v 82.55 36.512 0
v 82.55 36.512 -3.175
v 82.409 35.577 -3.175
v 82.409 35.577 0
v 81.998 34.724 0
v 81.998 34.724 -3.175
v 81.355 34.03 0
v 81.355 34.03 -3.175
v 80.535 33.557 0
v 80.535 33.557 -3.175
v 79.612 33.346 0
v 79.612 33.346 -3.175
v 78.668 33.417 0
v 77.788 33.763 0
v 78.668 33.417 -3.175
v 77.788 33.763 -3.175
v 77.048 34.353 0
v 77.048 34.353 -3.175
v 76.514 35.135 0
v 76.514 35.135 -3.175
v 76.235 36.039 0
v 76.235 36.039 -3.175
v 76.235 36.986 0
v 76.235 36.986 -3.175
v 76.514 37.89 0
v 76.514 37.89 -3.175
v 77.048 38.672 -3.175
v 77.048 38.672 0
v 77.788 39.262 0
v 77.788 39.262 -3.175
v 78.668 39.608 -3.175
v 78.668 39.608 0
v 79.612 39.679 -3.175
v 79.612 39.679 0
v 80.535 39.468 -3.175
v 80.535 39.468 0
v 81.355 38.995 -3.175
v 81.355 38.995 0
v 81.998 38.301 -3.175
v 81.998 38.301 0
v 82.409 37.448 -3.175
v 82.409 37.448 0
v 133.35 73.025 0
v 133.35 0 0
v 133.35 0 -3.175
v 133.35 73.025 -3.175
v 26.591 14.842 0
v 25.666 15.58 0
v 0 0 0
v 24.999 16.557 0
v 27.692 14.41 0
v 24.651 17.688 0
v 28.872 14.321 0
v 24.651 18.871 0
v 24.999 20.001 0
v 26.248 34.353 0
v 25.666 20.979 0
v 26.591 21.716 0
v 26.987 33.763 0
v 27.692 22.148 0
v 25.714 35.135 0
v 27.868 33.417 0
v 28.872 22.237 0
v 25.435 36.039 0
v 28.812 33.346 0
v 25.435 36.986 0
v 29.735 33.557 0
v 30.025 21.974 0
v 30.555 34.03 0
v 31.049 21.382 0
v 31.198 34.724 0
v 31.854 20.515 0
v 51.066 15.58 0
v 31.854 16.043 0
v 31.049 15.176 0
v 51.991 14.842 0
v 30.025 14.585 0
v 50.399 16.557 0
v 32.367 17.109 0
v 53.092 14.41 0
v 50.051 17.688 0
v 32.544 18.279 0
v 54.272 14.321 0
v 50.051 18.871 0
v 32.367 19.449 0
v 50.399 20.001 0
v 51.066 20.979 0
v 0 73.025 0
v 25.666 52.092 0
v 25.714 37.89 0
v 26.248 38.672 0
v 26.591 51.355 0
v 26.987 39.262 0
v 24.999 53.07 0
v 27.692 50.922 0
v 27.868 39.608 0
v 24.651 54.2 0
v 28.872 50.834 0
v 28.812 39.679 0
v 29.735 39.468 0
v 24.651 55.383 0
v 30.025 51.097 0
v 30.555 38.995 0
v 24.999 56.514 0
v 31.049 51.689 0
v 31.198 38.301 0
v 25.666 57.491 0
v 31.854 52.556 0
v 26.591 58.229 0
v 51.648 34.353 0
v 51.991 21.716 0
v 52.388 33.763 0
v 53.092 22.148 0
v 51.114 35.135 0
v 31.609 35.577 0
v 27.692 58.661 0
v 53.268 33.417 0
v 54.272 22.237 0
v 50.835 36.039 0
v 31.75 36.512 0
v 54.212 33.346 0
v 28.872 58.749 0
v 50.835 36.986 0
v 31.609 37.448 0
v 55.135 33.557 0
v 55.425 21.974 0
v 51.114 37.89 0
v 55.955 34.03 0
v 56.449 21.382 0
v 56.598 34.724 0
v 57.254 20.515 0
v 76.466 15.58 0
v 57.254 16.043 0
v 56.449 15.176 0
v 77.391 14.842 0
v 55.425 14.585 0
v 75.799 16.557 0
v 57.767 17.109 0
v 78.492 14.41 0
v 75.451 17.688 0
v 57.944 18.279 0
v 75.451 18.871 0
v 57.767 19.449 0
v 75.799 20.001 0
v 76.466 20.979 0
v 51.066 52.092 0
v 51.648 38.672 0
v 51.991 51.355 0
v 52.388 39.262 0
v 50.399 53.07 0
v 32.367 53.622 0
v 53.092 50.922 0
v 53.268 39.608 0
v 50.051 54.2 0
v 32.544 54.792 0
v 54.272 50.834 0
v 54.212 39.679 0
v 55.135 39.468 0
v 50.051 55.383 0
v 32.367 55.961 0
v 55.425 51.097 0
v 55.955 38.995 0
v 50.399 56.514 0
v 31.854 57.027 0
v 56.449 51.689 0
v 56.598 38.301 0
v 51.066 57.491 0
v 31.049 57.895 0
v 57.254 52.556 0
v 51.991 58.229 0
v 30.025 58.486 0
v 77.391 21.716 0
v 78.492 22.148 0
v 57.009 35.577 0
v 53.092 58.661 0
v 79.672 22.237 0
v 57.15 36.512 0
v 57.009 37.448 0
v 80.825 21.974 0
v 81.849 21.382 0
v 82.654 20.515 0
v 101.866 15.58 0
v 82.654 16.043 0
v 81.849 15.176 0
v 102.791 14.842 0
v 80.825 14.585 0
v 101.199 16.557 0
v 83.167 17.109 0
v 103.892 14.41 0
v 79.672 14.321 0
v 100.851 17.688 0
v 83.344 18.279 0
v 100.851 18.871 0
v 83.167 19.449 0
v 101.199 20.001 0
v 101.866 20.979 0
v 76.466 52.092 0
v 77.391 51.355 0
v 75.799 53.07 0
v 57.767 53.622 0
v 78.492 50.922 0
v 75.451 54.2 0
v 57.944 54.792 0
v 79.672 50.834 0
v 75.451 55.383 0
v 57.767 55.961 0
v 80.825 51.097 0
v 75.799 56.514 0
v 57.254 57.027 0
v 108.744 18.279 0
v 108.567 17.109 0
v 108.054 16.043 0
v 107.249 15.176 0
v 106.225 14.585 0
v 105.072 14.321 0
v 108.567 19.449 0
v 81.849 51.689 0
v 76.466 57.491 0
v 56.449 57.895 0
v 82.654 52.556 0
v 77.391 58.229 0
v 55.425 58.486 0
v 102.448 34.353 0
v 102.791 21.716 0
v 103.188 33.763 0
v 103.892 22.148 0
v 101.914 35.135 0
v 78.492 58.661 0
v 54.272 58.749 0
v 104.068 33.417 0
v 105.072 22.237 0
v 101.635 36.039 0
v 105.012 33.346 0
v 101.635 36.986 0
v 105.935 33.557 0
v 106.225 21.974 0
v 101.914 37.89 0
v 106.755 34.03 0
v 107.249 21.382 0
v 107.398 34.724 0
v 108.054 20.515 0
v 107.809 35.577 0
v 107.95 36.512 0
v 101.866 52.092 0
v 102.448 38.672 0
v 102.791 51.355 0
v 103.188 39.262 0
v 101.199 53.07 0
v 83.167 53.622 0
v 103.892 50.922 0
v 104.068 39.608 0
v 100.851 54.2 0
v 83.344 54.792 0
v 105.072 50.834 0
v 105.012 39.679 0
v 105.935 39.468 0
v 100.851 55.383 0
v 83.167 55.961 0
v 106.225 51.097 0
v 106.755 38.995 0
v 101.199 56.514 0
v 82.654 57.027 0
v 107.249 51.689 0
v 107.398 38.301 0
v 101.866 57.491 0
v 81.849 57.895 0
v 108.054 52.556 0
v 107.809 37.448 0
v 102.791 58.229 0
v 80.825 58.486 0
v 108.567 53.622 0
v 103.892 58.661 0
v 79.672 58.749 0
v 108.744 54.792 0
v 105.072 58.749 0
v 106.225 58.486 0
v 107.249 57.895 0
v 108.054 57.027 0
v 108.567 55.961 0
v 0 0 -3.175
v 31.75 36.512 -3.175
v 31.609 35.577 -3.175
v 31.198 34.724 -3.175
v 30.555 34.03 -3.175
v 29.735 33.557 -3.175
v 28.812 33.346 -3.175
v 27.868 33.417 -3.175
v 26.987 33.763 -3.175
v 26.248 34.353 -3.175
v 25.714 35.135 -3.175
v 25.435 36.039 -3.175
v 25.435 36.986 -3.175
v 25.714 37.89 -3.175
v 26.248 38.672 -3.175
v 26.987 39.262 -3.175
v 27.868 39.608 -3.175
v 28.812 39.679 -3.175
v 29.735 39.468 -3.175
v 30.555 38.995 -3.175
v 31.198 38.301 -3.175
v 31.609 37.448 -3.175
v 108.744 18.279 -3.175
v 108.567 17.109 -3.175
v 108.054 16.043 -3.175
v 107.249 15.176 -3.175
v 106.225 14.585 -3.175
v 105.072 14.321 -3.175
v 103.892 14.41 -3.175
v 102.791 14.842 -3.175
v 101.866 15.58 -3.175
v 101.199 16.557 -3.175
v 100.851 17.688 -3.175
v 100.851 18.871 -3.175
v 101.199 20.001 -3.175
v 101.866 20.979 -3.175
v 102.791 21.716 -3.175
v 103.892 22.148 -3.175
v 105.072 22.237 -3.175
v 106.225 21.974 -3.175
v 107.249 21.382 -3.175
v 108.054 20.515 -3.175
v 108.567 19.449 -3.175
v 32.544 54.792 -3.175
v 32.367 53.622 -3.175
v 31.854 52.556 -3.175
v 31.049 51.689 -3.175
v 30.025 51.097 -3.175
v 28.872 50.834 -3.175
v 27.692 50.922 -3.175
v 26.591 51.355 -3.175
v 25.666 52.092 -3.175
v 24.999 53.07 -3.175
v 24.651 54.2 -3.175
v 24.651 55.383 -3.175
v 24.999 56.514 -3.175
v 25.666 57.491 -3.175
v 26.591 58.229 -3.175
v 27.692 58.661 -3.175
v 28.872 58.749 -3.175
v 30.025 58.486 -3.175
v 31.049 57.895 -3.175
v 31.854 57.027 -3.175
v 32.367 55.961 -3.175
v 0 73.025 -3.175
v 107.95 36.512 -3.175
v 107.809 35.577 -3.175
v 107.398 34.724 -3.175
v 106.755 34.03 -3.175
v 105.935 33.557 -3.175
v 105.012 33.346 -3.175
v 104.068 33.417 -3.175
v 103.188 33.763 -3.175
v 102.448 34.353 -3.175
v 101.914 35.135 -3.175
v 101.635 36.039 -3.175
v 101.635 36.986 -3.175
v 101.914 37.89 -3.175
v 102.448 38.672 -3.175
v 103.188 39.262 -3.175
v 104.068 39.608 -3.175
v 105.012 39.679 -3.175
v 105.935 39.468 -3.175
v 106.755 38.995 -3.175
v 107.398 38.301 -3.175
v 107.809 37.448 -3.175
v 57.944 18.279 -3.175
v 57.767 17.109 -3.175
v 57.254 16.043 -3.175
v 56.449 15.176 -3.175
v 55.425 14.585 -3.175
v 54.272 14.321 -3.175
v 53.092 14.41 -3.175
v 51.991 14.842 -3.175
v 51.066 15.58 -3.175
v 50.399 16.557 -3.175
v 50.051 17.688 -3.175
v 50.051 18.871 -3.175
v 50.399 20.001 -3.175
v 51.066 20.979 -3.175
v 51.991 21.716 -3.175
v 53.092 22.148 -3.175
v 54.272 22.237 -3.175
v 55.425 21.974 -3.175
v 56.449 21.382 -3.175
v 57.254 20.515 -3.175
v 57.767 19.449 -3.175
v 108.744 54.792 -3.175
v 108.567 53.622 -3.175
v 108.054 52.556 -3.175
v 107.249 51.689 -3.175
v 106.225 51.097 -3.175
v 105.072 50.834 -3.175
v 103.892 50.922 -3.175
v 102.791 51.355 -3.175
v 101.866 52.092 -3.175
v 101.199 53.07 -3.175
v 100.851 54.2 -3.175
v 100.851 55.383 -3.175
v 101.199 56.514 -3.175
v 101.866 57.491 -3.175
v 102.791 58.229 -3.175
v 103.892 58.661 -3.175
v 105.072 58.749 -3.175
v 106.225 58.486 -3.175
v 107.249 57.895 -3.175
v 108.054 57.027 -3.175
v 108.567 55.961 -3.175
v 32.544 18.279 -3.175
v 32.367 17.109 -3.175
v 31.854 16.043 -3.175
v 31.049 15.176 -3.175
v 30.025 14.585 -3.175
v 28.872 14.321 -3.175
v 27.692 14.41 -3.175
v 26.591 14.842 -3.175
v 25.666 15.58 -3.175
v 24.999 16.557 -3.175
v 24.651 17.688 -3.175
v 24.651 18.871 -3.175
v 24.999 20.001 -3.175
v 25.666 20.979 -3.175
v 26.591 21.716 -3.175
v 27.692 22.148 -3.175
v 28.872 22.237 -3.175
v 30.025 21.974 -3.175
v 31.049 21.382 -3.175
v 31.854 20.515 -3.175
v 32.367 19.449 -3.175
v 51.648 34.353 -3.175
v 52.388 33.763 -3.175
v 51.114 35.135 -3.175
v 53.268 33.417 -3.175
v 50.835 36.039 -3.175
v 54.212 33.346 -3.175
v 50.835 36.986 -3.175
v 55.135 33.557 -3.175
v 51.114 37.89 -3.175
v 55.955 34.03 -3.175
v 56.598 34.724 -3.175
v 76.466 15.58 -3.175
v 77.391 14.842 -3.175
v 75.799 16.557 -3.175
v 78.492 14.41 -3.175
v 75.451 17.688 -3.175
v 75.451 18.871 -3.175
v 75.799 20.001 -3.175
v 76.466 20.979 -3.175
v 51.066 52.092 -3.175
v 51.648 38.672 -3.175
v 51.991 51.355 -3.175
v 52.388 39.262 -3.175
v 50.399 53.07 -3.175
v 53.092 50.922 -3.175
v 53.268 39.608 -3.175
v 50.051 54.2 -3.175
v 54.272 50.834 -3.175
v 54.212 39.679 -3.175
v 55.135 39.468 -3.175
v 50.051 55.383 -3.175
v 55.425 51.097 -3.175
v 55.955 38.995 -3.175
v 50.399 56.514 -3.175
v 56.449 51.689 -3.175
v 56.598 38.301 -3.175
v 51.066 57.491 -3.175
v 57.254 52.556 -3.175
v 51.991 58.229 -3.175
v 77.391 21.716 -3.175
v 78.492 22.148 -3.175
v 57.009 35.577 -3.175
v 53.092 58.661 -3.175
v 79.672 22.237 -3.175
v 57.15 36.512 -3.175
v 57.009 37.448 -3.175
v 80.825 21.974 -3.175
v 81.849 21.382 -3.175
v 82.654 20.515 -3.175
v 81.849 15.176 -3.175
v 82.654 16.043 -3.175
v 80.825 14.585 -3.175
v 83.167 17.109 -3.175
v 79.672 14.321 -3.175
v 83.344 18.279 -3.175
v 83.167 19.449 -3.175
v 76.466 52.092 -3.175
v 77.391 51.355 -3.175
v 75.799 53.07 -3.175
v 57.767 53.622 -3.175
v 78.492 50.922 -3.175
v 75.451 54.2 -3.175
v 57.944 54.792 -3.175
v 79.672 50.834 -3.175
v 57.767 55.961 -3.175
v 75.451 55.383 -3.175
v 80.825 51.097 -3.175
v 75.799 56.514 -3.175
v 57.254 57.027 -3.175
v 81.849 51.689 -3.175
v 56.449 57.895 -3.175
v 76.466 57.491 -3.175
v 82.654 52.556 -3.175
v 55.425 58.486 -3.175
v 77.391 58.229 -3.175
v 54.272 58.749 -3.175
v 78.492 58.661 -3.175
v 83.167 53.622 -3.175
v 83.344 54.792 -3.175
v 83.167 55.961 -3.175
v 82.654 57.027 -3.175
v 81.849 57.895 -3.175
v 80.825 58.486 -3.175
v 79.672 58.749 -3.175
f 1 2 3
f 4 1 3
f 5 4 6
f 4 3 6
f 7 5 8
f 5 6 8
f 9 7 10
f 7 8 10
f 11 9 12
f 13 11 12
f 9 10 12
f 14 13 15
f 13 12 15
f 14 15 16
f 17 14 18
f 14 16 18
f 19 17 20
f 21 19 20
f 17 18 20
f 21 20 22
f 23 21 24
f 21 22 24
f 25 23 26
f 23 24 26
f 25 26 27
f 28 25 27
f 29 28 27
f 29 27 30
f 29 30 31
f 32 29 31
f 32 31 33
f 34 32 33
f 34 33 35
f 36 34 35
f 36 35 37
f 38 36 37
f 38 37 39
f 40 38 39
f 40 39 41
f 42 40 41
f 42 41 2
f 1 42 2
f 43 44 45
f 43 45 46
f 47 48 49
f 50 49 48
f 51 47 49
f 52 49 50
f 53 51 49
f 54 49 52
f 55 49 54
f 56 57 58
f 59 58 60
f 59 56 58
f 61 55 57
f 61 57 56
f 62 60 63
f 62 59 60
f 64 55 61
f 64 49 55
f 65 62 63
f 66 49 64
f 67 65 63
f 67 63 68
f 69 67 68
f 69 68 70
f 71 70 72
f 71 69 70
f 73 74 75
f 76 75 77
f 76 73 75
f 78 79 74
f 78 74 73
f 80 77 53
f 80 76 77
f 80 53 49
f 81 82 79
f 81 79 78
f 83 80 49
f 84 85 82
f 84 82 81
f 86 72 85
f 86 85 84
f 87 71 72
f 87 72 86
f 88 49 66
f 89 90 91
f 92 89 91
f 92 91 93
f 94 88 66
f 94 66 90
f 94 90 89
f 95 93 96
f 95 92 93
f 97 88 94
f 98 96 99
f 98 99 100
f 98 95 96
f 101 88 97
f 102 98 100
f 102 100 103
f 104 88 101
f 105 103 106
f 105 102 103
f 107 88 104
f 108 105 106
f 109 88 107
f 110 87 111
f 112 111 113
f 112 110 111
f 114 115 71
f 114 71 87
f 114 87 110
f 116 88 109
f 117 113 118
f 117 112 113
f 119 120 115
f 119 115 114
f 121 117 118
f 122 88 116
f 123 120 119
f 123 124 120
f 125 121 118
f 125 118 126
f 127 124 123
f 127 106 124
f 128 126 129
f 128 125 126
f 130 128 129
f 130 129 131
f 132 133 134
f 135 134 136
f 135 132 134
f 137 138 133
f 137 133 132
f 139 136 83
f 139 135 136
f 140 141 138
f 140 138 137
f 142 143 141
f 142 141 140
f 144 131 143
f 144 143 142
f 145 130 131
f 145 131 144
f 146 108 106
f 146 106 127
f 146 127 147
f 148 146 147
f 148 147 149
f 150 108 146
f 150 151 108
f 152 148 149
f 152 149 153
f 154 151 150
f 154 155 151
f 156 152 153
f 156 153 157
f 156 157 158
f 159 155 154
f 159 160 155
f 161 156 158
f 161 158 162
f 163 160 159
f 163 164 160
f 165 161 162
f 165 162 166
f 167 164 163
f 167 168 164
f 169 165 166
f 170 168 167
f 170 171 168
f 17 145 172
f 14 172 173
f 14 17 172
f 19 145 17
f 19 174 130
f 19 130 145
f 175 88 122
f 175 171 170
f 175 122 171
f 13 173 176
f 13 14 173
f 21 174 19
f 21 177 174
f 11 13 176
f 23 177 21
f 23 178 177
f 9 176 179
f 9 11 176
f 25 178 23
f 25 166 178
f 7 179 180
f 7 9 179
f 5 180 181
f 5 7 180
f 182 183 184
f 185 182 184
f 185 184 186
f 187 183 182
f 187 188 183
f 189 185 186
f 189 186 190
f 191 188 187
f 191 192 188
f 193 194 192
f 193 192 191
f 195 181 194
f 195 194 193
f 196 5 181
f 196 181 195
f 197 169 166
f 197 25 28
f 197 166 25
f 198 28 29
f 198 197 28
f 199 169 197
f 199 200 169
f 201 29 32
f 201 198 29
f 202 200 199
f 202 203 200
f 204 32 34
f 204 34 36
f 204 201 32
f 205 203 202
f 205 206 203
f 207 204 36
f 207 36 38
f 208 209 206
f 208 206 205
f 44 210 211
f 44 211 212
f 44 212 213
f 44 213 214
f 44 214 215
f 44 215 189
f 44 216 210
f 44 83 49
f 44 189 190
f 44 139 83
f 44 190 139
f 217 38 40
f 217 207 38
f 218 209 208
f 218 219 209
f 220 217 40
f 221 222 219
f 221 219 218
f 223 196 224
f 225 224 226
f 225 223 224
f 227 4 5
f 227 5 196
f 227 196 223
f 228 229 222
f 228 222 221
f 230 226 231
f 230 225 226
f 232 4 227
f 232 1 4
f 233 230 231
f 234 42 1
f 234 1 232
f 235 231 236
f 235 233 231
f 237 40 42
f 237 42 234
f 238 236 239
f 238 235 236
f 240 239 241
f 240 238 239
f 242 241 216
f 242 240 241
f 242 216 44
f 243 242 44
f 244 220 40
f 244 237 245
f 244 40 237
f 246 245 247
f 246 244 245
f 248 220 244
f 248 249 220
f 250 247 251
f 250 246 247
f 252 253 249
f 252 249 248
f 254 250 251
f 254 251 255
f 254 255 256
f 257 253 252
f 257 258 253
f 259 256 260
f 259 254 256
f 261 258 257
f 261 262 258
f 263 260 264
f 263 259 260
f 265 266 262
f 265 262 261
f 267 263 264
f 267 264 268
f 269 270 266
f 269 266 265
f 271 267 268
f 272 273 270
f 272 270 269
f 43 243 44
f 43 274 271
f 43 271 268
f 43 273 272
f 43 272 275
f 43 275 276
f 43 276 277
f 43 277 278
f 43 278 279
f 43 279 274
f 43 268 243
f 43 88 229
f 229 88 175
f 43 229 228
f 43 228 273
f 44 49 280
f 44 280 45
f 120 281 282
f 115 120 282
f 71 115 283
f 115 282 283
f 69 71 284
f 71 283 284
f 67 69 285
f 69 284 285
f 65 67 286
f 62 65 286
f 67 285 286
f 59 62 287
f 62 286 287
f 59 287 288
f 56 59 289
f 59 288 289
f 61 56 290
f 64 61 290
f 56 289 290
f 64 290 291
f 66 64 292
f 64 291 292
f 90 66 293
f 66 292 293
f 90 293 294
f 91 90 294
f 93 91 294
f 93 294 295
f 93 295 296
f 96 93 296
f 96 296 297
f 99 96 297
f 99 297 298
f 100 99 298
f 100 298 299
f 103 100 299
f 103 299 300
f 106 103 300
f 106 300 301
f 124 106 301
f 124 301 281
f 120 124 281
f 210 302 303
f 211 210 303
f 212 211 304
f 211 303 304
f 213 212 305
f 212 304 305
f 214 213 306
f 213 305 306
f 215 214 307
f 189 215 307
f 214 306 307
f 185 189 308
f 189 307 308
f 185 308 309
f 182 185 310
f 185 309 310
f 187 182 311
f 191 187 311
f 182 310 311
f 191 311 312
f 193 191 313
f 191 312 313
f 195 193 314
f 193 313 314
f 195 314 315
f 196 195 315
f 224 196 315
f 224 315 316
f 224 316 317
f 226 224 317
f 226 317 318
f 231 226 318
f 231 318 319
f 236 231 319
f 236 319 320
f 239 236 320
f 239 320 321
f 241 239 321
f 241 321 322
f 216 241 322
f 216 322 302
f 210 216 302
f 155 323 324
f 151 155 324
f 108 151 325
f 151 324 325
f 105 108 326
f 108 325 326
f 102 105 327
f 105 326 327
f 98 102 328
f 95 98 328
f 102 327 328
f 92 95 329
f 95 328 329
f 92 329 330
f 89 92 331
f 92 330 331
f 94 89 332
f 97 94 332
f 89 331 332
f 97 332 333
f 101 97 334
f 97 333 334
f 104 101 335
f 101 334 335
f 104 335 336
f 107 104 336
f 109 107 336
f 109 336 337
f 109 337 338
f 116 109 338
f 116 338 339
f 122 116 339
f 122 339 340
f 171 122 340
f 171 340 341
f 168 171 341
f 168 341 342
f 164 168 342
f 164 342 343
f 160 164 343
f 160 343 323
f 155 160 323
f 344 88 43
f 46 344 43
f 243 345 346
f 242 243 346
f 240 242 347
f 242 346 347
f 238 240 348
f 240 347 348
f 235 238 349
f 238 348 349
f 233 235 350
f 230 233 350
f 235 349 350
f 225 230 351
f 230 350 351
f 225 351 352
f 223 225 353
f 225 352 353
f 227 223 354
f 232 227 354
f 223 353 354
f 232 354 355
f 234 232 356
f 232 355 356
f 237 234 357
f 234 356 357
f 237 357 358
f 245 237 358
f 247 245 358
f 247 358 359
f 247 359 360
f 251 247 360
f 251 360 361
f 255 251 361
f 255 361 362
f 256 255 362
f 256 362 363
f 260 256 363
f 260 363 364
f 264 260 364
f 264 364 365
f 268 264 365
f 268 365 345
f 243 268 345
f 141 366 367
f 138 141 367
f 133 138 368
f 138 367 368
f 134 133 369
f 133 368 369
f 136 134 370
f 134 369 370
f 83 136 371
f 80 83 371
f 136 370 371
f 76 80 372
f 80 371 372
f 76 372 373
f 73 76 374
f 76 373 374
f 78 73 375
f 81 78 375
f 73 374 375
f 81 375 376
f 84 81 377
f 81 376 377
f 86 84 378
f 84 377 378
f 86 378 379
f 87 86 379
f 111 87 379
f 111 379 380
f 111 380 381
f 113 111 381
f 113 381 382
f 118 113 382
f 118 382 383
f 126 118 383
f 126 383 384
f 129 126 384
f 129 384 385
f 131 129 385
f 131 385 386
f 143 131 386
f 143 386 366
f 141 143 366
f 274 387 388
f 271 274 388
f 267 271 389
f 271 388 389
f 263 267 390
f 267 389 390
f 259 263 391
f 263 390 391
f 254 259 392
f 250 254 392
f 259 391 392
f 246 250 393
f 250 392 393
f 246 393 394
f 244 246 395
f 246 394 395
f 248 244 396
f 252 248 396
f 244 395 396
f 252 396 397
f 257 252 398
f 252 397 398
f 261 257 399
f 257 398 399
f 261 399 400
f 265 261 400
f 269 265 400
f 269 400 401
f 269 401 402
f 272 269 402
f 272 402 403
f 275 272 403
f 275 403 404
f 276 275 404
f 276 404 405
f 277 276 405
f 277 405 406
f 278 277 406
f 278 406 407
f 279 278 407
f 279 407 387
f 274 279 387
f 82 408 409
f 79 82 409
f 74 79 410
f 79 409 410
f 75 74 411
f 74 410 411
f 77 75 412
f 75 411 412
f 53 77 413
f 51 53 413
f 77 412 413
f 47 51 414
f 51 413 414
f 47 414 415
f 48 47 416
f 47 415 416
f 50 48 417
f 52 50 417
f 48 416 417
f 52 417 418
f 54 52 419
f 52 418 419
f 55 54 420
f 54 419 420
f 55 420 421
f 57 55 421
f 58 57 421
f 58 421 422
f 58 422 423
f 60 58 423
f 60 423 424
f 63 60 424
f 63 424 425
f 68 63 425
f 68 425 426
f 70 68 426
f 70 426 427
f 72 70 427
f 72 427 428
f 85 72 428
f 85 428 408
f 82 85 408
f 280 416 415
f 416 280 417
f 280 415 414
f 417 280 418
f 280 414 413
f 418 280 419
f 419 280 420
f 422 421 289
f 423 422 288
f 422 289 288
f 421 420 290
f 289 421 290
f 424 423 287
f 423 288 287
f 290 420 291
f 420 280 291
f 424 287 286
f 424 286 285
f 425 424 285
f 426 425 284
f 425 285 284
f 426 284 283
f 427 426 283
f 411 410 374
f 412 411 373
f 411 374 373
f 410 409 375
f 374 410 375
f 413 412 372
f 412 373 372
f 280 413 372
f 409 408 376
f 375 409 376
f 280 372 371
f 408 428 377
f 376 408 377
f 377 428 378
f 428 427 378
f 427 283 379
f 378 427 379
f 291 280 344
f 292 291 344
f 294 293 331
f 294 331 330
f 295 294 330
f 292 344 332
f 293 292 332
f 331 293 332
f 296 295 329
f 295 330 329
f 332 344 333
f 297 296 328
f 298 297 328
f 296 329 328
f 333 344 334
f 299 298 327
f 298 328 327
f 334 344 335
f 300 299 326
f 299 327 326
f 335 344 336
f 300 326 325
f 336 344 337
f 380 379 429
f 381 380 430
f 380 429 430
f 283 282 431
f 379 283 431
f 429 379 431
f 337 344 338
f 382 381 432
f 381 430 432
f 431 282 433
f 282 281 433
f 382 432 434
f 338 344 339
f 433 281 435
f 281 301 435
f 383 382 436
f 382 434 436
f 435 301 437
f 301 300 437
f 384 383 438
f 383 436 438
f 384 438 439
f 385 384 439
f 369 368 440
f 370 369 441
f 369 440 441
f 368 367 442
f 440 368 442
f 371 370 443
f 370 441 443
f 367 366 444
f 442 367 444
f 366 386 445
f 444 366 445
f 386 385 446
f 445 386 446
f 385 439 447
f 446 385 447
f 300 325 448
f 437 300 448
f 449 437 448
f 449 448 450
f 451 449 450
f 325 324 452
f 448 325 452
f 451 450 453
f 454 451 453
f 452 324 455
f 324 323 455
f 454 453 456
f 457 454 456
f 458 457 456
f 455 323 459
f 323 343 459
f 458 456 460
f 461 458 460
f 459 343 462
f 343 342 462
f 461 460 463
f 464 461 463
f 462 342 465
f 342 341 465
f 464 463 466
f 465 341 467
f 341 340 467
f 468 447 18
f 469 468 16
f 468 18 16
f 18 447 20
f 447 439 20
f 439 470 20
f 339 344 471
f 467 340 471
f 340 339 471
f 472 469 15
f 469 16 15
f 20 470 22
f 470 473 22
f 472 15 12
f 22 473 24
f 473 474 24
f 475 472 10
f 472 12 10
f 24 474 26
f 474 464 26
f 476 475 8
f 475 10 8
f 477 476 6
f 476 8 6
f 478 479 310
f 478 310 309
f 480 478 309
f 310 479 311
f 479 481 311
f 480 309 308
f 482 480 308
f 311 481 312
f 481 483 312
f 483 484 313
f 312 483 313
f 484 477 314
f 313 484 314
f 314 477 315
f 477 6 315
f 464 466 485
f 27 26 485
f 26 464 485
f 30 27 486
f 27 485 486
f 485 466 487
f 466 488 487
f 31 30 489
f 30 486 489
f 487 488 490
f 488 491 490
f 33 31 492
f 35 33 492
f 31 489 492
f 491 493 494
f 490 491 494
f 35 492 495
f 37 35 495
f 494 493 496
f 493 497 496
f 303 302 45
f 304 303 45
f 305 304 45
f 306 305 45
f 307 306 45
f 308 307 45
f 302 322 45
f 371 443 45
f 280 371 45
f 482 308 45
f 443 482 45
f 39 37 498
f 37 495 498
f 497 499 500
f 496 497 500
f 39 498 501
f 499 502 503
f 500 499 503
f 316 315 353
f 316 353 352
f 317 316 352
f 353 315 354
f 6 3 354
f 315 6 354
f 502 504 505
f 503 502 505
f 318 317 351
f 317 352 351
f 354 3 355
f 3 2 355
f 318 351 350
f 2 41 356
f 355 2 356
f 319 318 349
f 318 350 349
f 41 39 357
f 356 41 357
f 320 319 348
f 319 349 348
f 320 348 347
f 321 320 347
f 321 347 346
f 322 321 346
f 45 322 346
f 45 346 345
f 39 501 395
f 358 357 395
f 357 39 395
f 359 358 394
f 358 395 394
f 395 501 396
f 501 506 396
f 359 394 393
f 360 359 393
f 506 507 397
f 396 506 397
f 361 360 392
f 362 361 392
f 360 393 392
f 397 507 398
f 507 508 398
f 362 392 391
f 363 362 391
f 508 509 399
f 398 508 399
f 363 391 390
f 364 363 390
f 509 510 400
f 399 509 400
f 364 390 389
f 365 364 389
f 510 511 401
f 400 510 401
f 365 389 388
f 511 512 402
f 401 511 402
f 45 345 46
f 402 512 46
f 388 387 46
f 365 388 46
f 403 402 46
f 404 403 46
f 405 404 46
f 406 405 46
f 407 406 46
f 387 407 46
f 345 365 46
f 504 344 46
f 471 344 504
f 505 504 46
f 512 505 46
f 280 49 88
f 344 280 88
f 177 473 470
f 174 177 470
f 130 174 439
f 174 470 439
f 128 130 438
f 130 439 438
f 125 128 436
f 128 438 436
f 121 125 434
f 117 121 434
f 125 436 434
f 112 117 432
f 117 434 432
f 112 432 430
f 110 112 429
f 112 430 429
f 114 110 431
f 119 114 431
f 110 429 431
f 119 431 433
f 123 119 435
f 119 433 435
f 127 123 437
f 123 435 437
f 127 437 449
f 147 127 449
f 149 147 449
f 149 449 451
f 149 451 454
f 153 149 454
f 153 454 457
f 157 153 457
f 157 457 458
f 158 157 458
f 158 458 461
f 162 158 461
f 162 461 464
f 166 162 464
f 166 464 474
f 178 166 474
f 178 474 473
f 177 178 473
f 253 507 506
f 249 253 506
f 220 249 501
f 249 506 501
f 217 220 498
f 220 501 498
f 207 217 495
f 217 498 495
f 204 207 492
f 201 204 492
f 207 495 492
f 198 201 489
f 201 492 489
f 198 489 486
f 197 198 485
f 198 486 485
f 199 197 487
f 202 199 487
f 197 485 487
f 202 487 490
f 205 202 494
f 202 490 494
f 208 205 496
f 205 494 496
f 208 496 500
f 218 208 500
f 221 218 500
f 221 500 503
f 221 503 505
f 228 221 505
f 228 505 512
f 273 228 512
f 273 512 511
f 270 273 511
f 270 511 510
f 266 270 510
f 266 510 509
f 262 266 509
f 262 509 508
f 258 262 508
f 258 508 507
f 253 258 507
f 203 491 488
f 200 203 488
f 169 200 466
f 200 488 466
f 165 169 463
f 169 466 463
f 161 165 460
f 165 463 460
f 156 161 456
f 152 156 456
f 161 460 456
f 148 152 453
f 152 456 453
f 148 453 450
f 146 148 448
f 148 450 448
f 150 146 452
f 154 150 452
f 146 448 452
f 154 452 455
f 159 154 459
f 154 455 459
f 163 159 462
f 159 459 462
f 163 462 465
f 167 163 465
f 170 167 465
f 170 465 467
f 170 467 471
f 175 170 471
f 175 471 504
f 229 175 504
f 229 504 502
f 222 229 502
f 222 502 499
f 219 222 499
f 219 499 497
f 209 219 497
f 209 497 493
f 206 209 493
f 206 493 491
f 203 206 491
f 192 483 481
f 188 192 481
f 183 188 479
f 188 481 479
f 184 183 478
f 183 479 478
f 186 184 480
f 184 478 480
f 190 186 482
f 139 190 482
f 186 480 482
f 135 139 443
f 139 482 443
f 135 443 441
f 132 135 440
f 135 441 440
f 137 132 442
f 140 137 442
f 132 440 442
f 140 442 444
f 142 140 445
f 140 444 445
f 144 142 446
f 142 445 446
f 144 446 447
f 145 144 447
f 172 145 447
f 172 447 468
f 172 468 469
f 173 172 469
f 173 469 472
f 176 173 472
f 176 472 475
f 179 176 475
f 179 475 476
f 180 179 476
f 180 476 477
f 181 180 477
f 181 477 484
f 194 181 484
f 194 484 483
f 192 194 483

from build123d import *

# Parameters (mm, degrees)
F0_W     = 133.35
F0_H     = 73.025
F1_DEPTH = 3.175
F2_R     = 3.175
F3_DEPTH = 3.176
F4_R     = 3.96875
F5_DEPTH = 3.176


with BuildPart() as f1:
    # F0 (on Top) → F1 (new body)
    with BuildSketch(Plane.XY):
        with Locations((66.675, 36.5125)):
            Rectangle(F0_W, F0_H)
    extrude(amount=-F1_DEPTH)

    # F2 (on face) → F3 (cut, through all)
    with BuildSketch(Plane(origin=(0, 0, -3.175), x_dir=(1, 0, 0), z_dir=(0, 0, -1))):
        with Locations((28.575, -36.5125)):
            Circle(F2_R)
        with Locations((53.975, -36.5125)):
            Circle(F2_R)
        with Locations((79.375, -36.5125)):
            Circle(F2_R)
        with Locations((104.775, -36.5125)):
            Circle(F2_R)
    extrude(amount=-F3_DEPTH, mode=Mode.SUBTRACT)

    # F4 (on face) → F5 (cut, through all)
    with BuildSketch(Plane(origin=(0, 0, -3.175), x_dir=(1, 0, 0), z_dir=(0, 0, -1))):
        with Locations((28.575, -54.79161)):
            Circle(F4_R)
        with Locations((53.975, -54.79161)):
            Circle(F4_R)
        with Locations((79.375, -54.79161)):
            Circle(F4_R)
        with Locations((104.775, -54.79161)):
            Circle(F4_R)
        with Locations((104.775, -18.27911)):
            Circle(F4_R)
        with Locations((79.375, -18.27911)):
            Circle(F4_R)
        with Locations((53.975, -18.27911)):
            Circle(F4_R)
        with Locations((28.575, -18.27911)):
            Circle(F4_R)
    extrude(amount=-F5_DEPTH, mode=Mode.SUBTRACT)


solid = f1.part
